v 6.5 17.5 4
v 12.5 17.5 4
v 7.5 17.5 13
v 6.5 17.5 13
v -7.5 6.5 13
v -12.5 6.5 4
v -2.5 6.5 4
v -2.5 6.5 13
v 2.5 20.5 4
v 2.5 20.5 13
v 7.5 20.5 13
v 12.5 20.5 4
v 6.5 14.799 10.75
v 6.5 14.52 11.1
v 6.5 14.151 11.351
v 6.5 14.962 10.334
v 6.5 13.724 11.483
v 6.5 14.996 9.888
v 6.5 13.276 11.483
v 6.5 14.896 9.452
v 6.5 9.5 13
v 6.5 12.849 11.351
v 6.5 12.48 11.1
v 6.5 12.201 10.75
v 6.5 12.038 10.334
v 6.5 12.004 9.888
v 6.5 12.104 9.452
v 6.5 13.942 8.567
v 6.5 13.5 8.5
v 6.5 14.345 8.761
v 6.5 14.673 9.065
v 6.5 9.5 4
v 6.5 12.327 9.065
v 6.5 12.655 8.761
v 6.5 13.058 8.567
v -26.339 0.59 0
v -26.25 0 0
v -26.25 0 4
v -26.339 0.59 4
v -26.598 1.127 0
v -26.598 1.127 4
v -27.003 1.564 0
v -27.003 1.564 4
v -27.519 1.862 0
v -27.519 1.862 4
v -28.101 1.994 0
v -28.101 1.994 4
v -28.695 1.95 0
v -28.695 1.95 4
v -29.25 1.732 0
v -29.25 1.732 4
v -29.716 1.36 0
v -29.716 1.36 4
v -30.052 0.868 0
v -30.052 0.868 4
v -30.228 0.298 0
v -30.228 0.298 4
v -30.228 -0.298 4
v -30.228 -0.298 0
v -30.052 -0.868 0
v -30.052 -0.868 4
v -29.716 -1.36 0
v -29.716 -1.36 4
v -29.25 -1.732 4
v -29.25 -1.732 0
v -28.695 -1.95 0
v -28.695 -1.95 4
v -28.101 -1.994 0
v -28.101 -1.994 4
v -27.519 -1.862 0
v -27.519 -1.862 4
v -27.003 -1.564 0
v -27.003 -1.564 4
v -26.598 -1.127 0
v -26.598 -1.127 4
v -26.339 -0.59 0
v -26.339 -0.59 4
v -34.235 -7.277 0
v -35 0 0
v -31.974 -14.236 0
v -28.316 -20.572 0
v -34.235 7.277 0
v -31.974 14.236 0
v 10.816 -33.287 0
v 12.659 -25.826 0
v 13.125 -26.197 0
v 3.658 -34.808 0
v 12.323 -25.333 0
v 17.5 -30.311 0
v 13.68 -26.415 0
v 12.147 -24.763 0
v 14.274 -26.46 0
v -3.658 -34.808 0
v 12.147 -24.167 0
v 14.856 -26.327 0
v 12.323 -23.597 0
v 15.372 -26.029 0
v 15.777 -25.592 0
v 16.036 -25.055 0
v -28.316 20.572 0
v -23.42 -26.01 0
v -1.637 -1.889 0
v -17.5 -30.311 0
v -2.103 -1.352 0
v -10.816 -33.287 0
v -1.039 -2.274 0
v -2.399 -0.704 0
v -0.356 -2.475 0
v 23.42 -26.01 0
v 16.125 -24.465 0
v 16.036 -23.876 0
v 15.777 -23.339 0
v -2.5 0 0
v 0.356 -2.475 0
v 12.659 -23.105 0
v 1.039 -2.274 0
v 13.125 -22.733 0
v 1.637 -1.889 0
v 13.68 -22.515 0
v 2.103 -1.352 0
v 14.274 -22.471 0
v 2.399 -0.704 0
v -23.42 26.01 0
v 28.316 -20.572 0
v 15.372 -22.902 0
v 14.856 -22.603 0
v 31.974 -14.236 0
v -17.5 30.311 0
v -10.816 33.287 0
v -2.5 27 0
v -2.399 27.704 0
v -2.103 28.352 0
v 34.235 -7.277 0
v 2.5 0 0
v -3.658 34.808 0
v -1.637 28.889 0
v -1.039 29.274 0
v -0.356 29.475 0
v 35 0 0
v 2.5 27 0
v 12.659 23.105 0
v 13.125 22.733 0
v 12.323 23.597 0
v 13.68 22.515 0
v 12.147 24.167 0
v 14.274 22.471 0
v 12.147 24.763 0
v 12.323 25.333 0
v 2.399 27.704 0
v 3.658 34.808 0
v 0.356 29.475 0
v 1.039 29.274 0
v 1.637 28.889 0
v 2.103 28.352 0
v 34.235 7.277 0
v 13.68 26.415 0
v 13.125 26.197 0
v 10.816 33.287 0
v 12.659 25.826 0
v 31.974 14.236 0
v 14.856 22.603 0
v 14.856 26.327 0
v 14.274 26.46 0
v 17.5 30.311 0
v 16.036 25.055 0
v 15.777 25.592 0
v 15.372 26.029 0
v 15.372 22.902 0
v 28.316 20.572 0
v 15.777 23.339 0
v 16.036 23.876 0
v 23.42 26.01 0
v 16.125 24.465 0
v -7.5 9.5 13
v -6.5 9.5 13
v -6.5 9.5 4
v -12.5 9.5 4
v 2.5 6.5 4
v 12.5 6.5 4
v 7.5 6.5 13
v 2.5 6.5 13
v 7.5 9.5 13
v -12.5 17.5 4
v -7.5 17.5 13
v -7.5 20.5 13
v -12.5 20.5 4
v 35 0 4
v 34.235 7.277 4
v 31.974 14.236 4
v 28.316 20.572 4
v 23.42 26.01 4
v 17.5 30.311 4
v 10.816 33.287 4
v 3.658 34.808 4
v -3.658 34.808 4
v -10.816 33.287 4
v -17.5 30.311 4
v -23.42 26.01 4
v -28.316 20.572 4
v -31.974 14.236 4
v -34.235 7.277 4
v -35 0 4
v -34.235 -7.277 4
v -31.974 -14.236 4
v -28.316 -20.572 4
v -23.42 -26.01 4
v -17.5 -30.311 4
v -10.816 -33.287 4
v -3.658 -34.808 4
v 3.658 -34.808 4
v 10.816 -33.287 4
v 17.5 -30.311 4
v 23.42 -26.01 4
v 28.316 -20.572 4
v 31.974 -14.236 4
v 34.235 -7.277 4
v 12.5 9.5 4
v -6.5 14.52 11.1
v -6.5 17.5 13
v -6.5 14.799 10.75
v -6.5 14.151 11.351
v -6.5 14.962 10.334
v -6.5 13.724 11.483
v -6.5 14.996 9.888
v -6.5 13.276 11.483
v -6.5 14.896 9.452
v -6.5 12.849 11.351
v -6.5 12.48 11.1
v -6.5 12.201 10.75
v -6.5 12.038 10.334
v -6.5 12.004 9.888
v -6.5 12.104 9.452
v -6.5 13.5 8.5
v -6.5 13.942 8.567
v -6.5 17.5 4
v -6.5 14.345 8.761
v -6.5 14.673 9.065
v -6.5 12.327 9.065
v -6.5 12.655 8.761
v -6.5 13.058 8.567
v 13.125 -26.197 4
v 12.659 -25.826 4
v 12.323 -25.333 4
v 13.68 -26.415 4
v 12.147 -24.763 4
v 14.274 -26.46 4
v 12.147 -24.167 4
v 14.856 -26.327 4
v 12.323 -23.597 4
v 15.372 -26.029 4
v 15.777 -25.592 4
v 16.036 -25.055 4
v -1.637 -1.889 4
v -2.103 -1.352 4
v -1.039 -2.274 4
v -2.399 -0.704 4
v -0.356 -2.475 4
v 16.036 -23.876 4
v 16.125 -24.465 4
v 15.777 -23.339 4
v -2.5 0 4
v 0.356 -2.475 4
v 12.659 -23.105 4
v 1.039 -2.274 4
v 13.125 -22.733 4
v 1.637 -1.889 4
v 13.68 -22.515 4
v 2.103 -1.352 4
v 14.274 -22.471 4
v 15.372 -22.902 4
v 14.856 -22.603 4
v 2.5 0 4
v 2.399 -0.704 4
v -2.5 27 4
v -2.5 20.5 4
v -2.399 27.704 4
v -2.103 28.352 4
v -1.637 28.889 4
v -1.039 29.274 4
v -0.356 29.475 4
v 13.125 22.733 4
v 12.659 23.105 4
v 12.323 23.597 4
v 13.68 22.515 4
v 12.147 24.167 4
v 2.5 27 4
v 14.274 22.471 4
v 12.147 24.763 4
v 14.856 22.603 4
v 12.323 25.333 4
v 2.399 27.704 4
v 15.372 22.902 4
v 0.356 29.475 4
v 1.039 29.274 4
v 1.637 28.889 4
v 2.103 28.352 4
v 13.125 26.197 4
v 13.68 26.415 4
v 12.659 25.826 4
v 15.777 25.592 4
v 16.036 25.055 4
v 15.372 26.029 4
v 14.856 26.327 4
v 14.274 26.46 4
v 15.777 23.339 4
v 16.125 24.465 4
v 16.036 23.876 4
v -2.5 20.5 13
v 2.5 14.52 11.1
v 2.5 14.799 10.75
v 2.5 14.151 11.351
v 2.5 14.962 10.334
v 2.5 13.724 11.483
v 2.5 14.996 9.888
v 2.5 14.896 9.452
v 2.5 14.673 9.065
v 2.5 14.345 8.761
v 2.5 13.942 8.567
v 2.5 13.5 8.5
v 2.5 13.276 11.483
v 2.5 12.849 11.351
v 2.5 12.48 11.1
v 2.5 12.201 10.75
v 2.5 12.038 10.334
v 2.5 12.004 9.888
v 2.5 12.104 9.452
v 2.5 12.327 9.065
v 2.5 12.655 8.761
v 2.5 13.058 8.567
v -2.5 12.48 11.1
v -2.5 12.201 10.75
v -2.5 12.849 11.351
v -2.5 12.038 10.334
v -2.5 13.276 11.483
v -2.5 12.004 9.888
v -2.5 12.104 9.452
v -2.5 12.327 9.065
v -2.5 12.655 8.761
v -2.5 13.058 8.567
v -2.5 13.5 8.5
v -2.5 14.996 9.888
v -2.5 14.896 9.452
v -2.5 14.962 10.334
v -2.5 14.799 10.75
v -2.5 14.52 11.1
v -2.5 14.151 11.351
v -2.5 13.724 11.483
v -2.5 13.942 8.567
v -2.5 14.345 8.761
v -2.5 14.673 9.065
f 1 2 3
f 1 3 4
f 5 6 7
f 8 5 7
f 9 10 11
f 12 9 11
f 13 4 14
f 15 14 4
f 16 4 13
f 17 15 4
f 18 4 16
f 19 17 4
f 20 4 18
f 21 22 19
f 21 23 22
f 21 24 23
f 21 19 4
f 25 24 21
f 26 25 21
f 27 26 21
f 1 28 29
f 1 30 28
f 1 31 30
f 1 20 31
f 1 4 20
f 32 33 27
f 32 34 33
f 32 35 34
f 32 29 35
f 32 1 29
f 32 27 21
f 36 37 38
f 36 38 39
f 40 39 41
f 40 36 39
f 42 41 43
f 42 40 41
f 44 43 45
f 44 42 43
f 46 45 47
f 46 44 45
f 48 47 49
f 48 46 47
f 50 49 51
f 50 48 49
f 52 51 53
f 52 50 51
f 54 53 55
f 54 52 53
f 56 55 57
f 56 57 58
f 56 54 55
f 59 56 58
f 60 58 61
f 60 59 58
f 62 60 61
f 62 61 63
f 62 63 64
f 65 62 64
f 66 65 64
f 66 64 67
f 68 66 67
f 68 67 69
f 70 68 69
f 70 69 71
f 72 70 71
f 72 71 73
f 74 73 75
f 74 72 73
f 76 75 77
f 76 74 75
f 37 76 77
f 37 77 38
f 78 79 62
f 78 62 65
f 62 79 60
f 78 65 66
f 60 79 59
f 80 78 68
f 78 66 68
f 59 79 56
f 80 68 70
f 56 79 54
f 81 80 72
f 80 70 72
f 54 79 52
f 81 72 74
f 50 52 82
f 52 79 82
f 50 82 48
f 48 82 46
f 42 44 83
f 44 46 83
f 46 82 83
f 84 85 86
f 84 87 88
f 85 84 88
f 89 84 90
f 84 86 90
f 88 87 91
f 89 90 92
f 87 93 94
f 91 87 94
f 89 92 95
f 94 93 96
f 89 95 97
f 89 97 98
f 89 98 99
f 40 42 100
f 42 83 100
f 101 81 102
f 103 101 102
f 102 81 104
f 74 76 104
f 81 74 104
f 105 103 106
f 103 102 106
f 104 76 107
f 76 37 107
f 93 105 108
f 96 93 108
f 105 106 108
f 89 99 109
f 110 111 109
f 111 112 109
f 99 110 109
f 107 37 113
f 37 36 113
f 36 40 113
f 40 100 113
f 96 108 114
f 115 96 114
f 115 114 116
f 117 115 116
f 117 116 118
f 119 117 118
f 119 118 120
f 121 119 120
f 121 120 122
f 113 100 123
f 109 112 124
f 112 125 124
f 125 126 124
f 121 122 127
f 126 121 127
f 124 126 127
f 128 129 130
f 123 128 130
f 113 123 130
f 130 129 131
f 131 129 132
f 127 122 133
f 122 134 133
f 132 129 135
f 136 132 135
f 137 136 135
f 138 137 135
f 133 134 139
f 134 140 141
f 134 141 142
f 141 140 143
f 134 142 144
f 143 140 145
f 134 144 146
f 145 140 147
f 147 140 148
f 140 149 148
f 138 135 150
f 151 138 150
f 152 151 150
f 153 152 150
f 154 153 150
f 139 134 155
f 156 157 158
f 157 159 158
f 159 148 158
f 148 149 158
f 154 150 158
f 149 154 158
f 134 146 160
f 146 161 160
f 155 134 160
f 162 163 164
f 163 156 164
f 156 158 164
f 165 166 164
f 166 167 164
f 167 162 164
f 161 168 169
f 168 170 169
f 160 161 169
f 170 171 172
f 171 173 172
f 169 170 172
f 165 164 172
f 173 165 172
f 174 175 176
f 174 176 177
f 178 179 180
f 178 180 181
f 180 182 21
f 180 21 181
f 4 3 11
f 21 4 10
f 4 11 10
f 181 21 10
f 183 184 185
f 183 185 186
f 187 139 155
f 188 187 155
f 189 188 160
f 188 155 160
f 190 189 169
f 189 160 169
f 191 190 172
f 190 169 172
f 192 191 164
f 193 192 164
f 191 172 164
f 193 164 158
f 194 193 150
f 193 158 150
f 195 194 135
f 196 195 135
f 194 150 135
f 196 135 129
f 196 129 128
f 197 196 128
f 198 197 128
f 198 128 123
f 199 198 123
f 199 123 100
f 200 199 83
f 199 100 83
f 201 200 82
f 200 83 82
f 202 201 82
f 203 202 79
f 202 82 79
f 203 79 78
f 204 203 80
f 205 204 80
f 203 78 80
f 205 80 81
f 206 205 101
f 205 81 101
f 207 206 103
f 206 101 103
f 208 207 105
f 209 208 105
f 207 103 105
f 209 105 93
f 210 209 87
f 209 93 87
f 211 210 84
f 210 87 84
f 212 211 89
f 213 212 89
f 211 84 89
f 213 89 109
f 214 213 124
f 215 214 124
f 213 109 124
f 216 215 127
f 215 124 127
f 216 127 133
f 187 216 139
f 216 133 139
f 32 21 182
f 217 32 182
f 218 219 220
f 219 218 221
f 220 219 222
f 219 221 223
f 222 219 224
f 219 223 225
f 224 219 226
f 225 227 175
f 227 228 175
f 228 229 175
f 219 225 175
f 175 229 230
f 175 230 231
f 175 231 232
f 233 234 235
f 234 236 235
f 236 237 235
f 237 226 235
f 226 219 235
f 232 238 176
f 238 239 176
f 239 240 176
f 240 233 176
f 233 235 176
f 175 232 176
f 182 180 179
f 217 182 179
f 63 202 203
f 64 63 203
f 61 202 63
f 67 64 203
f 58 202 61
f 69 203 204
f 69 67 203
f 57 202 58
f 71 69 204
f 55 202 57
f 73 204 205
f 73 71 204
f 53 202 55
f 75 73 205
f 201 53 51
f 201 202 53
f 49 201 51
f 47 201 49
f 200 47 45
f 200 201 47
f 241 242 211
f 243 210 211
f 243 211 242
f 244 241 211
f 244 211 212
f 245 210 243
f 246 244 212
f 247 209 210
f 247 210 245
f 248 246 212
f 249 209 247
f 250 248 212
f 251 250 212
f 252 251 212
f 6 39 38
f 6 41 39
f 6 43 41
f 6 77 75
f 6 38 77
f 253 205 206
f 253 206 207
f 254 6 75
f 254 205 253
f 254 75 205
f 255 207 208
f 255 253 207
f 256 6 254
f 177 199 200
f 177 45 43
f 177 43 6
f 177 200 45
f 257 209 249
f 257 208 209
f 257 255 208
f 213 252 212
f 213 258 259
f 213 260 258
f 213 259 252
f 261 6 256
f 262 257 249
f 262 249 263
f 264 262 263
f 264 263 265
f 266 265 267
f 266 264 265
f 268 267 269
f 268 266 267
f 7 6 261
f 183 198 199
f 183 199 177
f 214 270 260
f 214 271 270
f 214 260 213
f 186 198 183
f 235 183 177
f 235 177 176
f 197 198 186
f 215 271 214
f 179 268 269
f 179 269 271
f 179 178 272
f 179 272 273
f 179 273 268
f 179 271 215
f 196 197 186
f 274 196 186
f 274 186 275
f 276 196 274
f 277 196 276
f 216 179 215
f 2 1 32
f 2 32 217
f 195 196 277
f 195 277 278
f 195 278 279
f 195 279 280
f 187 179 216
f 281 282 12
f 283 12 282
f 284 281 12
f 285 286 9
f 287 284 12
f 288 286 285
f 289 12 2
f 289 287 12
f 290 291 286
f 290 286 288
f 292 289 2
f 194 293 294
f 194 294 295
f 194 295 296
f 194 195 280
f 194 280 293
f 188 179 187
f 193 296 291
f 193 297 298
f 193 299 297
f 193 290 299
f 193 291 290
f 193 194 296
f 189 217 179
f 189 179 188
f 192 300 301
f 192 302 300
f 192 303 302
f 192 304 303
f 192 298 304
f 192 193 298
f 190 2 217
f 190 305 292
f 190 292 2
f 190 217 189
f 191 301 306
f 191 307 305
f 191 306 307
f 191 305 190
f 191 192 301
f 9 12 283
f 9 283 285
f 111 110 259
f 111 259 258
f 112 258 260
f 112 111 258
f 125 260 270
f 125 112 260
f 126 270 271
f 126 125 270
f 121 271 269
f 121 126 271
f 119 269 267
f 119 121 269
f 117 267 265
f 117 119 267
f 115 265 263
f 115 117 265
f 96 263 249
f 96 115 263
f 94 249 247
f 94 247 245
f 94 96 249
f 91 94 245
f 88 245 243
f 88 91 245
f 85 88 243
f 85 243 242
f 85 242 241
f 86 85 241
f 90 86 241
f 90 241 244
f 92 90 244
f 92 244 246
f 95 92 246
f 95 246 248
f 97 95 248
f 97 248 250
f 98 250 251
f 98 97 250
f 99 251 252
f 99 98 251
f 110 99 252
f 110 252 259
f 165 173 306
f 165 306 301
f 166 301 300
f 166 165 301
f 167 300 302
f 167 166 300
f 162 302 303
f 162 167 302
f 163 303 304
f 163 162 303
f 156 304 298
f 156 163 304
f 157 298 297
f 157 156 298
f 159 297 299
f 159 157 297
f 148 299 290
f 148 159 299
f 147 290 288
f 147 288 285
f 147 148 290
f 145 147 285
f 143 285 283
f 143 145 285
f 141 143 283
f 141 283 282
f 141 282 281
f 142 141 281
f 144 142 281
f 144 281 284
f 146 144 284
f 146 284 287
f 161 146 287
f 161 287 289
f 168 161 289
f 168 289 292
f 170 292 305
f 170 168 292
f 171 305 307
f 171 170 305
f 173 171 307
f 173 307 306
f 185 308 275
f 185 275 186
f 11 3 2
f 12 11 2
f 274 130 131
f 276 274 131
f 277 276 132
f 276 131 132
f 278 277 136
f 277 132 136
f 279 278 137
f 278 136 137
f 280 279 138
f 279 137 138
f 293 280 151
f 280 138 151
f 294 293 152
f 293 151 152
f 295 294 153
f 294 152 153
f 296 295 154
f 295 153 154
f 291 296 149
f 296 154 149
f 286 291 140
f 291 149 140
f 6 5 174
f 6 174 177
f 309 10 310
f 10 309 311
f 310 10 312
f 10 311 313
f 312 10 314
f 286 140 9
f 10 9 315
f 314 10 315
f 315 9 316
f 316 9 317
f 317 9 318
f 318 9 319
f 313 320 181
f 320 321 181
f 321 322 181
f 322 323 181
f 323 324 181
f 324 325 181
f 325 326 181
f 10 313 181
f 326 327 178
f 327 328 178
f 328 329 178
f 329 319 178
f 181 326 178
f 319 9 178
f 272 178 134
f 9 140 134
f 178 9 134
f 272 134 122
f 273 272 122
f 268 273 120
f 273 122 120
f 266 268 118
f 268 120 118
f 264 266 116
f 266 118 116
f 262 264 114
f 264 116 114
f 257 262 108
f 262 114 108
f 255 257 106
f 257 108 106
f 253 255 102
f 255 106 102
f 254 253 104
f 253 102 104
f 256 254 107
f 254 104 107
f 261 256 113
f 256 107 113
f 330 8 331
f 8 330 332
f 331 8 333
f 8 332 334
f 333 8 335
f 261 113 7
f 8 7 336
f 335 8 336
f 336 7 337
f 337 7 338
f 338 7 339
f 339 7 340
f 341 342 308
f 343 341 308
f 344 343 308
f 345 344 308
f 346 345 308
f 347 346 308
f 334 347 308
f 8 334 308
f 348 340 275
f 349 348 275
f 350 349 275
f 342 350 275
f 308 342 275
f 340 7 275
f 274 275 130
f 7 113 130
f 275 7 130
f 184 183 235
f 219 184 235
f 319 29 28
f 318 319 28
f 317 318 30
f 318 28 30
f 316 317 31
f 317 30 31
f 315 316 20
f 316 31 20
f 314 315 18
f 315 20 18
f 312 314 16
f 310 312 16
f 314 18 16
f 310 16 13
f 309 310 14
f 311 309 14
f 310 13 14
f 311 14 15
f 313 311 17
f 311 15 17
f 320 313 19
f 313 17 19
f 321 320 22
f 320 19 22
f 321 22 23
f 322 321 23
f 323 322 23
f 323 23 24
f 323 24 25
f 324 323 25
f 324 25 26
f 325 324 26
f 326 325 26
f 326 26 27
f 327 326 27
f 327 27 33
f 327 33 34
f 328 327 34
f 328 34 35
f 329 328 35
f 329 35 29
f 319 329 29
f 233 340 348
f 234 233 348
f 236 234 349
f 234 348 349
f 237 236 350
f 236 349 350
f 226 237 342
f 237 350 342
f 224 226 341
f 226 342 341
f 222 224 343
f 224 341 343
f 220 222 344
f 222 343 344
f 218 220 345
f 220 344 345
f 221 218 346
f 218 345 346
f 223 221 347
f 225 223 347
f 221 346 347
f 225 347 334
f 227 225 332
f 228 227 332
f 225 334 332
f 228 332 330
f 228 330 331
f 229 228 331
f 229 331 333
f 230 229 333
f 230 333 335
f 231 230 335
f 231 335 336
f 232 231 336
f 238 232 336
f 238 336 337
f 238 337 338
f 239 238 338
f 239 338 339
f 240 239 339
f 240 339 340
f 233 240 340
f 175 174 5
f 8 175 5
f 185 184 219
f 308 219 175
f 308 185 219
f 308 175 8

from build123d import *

# Parameters (mm, degrees)
SKETCH_1_R          = 35
SKETCH_1_R_2        = 2
EXTRUDE_1_DEPTH     = 4
EXTRUDE_2_DEPTH     = 9
CUT_EXTRUDE_1_DEPTH = 14
SKETCH_4_R          = 1.45
CUT_EXTRUDE_2_DEPTH = 13
SKETCH_5_R          = 1.5
CUT_EXTRUDE_3_DEPTH = 13


with BuildPart() as part:
    # 草图1 → 凸台-拉伸1 (new body)
    with BuildSketch(Plane.XY):
        Circle(SKETCH_1_R)
        with Locations((14.125, 24.465217657)):
            Circle(SKETCH_1_R_2, mode=Mode.SUBTRACT)
        with Locations((14.125, -24.465217657)):
            Circle(SKETCH_1_R_2, mode=Mode.SUBTRACT)
        with Locations((-28.25, 0)):
            Circle(SKETCH_1_R_2, mode=Mode.SUBTRACT)
        with BuildLine():
            Line((-2.5, 0), (-2.5, 27))
            ThreePointArc((-2.5, 27), (0, 29.5), (2.5, 27))
            Line((2.5, 27), (2.5, 0))
            ThreePointArc((2.5, 0), (0, -2.5), (-2.5, 0))
        make_face(mode=Mode.SUBTRACT)
    extrude(amount=EXTRUDE_1_DEPTH)

    # 草图2 → 凸台-拉伸2 (add)
    with BuildSketch(Plane.XY.offset(4)):
        Polygon((-2.5, 13.5), (-2.5, 20.5), (-12.5, 20.5), (-12.5, 17.5), (-6.5, 17.5), (-6.5, 9.5), (-12.5, 9.5), (-12.5, 6.5), (-2.5, 6.5), align=None)
        Polygon((2.5, 6.5), (2.5, 13.5), (2.5, 20.5), (12.5, 20.5), (12.5, 17.5), (6.5, 17.5), (6.5, 9.5), (12.5, 9.5), (12.5, 6.5), align=None)
    extrude(amount=EXTRUDE_2_DEPTH)

    # 草图3 → 切除-拉伸1 (cut)
    with BuildSketch(Plane.XZ.offset(-6.5)):
        Polygon((-12.5, 4), (-12.5, 13), (-7.5, 13), align=None)
        Polygon((12.5, 4), (12.5, 13), (7.5, 13), align=None)
    extrude(amount=-CUT_EXTRUDE_1_DEPTH, mode=Mode.SUBTRACT)

    # 草图4 → 切除-拉伸2 (cut)
    with BuildSketch(Plane.ZY.offset(6.5)):
        with Locations((10, 13.5)):
            Circle(SKETCH_4_R)
    extrude(amount=-CUT_EXTRUDE_2_DEPTH, mode=Mode.SUBTRACT)

    # 草图5 → 切除-拉伸3 (cut)
    with BuildSketch(Plane(origin=(6.5, 0, 0), x_dir=(0, 0, -1), z_dir=(1, 0, 0))):
        with Locations((-10, 13.5)):
            Circle(SKETCH_5_R)
    extrude(amount=-CUT_EXTRUDE_3_DEPTH, mode=Mode.SUBTRACT)


solid = part.part
